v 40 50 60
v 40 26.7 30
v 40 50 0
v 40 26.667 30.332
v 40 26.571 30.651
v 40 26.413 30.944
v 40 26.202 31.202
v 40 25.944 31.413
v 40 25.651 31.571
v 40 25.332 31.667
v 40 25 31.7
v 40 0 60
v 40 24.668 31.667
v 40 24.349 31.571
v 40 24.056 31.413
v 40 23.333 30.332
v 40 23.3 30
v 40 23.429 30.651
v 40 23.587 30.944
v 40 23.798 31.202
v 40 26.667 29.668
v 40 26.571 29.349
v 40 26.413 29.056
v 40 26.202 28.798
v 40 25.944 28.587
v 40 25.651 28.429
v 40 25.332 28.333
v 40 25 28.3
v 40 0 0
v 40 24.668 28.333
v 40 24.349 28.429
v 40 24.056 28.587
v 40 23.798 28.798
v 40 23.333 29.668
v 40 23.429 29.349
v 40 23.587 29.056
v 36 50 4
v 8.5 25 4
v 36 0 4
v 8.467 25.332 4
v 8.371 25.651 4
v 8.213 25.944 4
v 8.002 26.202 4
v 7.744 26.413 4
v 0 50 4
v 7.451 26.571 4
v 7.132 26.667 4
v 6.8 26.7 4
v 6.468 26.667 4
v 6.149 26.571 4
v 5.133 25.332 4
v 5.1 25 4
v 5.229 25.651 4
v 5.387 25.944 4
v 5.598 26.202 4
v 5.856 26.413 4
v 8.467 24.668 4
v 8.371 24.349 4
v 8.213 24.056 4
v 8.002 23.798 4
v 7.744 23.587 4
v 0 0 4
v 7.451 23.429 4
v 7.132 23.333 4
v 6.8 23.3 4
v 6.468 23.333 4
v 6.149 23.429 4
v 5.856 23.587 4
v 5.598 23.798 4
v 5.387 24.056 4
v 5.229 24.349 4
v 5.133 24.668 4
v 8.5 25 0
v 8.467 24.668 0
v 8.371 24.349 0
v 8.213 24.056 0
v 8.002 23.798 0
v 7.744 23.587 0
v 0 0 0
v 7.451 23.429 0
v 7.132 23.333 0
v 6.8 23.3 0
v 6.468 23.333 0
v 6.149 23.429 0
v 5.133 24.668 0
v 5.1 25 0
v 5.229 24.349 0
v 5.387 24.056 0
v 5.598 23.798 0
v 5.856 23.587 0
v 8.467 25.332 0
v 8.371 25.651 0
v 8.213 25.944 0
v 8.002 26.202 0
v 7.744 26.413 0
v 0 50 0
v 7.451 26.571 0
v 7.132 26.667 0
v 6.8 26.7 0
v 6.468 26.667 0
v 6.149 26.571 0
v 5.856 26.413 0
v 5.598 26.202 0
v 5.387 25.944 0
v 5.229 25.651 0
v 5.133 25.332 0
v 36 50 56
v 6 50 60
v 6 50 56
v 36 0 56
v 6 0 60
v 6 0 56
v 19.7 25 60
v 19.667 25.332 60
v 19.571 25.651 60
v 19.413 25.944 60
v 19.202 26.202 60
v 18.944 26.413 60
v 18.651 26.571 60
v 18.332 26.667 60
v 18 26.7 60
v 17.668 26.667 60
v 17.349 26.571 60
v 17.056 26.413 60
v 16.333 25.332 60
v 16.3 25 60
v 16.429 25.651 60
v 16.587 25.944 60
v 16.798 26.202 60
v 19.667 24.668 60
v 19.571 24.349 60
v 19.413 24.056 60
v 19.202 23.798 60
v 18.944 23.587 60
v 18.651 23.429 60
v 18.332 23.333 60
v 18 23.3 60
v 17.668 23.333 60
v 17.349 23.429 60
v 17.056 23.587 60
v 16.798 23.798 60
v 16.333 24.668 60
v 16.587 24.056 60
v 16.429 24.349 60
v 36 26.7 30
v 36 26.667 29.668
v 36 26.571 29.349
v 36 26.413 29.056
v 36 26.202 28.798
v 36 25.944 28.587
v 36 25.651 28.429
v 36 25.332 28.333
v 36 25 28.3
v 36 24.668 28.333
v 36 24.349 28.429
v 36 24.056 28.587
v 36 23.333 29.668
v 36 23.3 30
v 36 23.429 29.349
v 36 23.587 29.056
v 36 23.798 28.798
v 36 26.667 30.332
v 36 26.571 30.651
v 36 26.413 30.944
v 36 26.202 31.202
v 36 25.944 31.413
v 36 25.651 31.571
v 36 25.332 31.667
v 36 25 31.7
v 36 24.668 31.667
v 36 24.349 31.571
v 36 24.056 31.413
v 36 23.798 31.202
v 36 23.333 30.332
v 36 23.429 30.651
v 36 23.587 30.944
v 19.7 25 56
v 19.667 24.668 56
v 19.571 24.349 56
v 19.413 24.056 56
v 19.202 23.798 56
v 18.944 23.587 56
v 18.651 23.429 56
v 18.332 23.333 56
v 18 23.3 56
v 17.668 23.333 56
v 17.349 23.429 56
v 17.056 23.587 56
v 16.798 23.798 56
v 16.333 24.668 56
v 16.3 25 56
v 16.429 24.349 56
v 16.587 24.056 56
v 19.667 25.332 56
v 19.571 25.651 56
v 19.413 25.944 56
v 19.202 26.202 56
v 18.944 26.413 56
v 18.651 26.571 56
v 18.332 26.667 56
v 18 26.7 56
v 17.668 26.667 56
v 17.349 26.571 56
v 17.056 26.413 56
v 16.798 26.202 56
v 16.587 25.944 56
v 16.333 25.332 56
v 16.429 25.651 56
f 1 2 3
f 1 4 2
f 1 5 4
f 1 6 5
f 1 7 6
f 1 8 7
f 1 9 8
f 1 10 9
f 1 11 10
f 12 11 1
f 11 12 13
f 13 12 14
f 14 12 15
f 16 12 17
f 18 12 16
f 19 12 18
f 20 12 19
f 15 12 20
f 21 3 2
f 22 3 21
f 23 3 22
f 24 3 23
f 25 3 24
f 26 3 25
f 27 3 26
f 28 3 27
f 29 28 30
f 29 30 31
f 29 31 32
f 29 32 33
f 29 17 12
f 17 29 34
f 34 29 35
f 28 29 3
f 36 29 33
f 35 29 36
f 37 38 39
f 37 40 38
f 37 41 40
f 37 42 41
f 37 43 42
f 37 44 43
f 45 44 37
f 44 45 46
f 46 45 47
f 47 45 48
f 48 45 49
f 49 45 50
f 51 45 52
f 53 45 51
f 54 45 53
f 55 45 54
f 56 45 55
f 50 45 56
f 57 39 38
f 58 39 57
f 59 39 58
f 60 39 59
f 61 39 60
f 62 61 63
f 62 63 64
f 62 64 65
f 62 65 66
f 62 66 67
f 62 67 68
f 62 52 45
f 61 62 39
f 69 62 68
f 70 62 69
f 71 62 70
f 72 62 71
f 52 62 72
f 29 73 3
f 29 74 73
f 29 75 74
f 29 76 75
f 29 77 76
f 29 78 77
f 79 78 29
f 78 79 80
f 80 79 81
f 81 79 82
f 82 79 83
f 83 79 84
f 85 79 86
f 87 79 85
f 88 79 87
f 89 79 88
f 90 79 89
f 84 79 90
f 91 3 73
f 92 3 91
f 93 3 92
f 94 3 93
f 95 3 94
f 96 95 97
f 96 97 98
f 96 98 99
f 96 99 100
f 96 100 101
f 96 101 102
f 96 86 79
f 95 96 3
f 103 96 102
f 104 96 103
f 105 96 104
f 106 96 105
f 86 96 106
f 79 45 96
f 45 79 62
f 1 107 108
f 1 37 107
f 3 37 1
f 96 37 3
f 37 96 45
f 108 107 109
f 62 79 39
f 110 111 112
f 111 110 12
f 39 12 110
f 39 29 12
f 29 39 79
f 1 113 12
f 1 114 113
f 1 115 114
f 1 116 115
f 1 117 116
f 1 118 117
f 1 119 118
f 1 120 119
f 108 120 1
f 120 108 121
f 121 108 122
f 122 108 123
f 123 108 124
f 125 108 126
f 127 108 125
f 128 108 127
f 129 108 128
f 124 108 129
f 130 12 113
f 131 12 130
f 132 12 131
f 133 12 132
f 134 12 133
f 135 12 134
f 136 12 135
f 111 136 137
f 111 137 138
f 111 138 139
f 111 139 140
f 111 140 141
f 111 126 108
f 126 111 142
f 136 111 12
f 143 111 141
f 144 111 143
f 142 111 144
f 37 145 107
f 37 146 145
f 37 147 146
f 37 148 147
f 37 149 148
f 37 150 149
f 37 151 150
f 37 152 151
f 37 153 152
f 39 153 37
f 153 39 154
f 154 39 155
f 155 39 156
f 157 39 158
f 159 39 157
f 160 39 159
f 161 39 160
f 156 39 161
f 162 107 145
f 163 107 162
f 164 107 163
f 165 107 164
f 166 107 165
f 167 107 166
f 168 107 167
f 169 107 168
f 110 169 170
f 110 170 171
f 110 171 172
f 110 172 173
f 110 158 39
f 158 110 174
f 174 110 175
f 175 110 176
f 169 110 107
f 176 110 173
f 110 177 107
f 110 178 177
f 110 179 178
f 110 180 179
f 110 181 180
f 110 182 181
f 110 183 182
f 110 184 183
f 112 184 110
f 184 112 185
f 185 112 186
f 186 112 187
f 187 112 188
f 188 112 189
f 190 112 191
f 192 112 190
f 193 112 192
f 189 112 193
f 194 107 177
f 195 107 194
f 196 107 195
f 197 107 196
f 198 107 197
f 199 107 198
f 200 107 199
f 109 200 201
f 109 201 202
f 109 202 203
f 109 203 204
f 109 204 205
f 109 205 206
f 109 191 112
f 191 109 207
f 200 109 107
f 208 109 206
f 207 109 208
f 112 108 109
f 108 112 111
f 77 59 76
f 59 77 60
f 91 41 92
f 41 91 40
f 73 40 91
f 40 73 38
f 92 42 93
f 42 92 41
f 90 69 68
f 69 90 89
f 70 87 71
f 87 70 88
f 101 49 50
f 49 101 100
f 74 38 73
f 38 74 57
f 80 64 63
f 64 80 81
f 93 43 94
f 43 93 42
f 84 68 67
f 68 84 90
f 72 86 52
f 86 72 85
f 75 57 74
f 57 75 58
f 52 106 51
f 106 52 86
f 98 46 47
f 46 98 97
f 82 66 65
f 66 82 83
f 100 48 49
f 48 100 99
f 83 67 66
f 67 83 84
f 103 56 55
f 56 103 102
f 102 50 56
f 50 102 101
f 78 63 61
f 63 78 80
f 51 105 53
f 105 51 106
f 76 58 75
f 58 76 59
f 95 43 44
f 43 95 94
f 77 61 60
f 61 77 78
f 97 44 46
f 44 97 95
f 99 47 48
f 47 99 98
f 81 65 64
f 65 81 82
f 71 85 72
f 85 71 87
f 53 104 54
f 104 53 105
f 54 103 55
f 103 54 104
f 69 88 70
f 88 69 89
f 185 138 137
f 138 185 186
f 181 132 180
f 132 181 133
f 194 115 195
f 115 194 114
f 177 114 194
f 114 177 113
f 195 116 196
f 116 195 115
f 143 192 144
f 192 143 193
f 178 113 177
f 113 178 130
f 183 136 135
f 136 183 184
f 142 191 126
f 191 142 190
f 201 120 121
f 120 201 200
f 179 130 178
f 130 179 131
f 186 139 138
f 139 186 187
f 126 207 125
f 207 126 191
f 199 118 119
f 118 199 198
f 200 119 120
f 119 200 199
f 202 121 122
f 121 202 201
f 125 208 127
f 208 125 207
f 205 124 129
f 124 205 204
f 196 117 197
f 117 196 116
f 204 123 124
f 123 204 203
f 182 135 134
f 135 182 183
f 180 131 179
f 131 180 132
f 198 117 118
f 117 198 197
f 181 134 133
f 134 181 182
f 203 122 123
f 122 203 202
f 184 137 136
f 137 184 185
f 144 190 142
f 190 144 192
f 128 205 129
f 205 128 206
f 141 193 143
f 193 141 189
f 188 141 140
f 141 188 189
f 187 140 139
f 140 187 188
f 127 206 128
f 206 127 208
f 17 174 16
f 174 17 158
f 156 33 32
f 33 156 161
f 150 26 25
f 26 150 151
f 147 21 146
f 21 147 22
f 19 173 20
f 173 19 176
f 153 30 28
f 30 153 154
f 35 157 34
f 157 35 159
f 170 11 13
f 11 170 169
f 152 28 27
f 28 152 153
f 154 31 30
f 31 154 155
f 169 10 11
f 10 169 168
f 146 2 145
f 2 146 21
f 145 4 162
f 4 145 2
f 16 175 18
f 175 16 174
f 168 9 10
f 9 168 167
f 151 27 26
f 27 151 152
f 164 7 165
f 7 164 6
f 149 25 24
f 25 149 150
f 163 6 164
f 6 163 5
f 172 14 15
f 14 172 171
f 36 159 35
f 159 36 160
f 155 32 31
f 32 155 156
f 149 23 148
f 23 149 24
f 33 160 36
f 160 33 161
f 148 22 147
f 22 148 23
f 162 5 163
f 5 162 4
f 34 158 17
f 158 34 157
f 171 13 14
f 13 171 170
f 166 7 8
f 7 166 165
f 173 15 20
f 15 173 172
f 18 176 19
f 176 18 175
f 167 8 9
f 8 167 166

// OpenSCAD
$fn = 32;

// ----------------------------------------------------------------------
// Z-bracket: 40 x 50 x 60 mm
// ----------------------------------------------------------------------

// --- parameters (mm) ---
lower_leg = 40;           // lower foot length, X
upper_leg = 30;           // upper foot length, X
bracket_w = 50;           // bracket width, Y
offset_h = 60;            // overall rise, Z
sheet_t = 4;              // plate thickness
hole_d = 3.4;             // clearance for M3

module hole_z(px, py, z0) {
  translate([px, py, z0 - 2.5]) cylinder(h = sheet_t + 5, d = hole_d);
}
module hole_x(py, pz) {
  translate([-2.5, py, pz]) rotate([0, 90, 0]) cylinder(h = sheet_t + 5, d = hole_d);
}

difference() {
  union() {
    cube([lower_leg, bracket_w, sheet_t]);
    /* web, overlapping the lower foot */
    translate([lower_leg - sheet_t, 0, 0]) cube([sheet_t, bracket_w, offset_h]);
    /* upper foot, sunk into the web */
    translate([lower_leg - sheet_t - upper_leg, 0, offset_h - sheet_t]) cube([upper_leg + sheet_t, bracket_w, sheet_t]);
  }
  hole_z(6.8, 25, 0);
  translate([lower_leg - sheet_t - 18, 0, 0]) hole_z(0, 25, offset_h - sheet_t);
  translate([lower_leg - sheet_t, 0, 0]) hole_x(25, 30);
}
